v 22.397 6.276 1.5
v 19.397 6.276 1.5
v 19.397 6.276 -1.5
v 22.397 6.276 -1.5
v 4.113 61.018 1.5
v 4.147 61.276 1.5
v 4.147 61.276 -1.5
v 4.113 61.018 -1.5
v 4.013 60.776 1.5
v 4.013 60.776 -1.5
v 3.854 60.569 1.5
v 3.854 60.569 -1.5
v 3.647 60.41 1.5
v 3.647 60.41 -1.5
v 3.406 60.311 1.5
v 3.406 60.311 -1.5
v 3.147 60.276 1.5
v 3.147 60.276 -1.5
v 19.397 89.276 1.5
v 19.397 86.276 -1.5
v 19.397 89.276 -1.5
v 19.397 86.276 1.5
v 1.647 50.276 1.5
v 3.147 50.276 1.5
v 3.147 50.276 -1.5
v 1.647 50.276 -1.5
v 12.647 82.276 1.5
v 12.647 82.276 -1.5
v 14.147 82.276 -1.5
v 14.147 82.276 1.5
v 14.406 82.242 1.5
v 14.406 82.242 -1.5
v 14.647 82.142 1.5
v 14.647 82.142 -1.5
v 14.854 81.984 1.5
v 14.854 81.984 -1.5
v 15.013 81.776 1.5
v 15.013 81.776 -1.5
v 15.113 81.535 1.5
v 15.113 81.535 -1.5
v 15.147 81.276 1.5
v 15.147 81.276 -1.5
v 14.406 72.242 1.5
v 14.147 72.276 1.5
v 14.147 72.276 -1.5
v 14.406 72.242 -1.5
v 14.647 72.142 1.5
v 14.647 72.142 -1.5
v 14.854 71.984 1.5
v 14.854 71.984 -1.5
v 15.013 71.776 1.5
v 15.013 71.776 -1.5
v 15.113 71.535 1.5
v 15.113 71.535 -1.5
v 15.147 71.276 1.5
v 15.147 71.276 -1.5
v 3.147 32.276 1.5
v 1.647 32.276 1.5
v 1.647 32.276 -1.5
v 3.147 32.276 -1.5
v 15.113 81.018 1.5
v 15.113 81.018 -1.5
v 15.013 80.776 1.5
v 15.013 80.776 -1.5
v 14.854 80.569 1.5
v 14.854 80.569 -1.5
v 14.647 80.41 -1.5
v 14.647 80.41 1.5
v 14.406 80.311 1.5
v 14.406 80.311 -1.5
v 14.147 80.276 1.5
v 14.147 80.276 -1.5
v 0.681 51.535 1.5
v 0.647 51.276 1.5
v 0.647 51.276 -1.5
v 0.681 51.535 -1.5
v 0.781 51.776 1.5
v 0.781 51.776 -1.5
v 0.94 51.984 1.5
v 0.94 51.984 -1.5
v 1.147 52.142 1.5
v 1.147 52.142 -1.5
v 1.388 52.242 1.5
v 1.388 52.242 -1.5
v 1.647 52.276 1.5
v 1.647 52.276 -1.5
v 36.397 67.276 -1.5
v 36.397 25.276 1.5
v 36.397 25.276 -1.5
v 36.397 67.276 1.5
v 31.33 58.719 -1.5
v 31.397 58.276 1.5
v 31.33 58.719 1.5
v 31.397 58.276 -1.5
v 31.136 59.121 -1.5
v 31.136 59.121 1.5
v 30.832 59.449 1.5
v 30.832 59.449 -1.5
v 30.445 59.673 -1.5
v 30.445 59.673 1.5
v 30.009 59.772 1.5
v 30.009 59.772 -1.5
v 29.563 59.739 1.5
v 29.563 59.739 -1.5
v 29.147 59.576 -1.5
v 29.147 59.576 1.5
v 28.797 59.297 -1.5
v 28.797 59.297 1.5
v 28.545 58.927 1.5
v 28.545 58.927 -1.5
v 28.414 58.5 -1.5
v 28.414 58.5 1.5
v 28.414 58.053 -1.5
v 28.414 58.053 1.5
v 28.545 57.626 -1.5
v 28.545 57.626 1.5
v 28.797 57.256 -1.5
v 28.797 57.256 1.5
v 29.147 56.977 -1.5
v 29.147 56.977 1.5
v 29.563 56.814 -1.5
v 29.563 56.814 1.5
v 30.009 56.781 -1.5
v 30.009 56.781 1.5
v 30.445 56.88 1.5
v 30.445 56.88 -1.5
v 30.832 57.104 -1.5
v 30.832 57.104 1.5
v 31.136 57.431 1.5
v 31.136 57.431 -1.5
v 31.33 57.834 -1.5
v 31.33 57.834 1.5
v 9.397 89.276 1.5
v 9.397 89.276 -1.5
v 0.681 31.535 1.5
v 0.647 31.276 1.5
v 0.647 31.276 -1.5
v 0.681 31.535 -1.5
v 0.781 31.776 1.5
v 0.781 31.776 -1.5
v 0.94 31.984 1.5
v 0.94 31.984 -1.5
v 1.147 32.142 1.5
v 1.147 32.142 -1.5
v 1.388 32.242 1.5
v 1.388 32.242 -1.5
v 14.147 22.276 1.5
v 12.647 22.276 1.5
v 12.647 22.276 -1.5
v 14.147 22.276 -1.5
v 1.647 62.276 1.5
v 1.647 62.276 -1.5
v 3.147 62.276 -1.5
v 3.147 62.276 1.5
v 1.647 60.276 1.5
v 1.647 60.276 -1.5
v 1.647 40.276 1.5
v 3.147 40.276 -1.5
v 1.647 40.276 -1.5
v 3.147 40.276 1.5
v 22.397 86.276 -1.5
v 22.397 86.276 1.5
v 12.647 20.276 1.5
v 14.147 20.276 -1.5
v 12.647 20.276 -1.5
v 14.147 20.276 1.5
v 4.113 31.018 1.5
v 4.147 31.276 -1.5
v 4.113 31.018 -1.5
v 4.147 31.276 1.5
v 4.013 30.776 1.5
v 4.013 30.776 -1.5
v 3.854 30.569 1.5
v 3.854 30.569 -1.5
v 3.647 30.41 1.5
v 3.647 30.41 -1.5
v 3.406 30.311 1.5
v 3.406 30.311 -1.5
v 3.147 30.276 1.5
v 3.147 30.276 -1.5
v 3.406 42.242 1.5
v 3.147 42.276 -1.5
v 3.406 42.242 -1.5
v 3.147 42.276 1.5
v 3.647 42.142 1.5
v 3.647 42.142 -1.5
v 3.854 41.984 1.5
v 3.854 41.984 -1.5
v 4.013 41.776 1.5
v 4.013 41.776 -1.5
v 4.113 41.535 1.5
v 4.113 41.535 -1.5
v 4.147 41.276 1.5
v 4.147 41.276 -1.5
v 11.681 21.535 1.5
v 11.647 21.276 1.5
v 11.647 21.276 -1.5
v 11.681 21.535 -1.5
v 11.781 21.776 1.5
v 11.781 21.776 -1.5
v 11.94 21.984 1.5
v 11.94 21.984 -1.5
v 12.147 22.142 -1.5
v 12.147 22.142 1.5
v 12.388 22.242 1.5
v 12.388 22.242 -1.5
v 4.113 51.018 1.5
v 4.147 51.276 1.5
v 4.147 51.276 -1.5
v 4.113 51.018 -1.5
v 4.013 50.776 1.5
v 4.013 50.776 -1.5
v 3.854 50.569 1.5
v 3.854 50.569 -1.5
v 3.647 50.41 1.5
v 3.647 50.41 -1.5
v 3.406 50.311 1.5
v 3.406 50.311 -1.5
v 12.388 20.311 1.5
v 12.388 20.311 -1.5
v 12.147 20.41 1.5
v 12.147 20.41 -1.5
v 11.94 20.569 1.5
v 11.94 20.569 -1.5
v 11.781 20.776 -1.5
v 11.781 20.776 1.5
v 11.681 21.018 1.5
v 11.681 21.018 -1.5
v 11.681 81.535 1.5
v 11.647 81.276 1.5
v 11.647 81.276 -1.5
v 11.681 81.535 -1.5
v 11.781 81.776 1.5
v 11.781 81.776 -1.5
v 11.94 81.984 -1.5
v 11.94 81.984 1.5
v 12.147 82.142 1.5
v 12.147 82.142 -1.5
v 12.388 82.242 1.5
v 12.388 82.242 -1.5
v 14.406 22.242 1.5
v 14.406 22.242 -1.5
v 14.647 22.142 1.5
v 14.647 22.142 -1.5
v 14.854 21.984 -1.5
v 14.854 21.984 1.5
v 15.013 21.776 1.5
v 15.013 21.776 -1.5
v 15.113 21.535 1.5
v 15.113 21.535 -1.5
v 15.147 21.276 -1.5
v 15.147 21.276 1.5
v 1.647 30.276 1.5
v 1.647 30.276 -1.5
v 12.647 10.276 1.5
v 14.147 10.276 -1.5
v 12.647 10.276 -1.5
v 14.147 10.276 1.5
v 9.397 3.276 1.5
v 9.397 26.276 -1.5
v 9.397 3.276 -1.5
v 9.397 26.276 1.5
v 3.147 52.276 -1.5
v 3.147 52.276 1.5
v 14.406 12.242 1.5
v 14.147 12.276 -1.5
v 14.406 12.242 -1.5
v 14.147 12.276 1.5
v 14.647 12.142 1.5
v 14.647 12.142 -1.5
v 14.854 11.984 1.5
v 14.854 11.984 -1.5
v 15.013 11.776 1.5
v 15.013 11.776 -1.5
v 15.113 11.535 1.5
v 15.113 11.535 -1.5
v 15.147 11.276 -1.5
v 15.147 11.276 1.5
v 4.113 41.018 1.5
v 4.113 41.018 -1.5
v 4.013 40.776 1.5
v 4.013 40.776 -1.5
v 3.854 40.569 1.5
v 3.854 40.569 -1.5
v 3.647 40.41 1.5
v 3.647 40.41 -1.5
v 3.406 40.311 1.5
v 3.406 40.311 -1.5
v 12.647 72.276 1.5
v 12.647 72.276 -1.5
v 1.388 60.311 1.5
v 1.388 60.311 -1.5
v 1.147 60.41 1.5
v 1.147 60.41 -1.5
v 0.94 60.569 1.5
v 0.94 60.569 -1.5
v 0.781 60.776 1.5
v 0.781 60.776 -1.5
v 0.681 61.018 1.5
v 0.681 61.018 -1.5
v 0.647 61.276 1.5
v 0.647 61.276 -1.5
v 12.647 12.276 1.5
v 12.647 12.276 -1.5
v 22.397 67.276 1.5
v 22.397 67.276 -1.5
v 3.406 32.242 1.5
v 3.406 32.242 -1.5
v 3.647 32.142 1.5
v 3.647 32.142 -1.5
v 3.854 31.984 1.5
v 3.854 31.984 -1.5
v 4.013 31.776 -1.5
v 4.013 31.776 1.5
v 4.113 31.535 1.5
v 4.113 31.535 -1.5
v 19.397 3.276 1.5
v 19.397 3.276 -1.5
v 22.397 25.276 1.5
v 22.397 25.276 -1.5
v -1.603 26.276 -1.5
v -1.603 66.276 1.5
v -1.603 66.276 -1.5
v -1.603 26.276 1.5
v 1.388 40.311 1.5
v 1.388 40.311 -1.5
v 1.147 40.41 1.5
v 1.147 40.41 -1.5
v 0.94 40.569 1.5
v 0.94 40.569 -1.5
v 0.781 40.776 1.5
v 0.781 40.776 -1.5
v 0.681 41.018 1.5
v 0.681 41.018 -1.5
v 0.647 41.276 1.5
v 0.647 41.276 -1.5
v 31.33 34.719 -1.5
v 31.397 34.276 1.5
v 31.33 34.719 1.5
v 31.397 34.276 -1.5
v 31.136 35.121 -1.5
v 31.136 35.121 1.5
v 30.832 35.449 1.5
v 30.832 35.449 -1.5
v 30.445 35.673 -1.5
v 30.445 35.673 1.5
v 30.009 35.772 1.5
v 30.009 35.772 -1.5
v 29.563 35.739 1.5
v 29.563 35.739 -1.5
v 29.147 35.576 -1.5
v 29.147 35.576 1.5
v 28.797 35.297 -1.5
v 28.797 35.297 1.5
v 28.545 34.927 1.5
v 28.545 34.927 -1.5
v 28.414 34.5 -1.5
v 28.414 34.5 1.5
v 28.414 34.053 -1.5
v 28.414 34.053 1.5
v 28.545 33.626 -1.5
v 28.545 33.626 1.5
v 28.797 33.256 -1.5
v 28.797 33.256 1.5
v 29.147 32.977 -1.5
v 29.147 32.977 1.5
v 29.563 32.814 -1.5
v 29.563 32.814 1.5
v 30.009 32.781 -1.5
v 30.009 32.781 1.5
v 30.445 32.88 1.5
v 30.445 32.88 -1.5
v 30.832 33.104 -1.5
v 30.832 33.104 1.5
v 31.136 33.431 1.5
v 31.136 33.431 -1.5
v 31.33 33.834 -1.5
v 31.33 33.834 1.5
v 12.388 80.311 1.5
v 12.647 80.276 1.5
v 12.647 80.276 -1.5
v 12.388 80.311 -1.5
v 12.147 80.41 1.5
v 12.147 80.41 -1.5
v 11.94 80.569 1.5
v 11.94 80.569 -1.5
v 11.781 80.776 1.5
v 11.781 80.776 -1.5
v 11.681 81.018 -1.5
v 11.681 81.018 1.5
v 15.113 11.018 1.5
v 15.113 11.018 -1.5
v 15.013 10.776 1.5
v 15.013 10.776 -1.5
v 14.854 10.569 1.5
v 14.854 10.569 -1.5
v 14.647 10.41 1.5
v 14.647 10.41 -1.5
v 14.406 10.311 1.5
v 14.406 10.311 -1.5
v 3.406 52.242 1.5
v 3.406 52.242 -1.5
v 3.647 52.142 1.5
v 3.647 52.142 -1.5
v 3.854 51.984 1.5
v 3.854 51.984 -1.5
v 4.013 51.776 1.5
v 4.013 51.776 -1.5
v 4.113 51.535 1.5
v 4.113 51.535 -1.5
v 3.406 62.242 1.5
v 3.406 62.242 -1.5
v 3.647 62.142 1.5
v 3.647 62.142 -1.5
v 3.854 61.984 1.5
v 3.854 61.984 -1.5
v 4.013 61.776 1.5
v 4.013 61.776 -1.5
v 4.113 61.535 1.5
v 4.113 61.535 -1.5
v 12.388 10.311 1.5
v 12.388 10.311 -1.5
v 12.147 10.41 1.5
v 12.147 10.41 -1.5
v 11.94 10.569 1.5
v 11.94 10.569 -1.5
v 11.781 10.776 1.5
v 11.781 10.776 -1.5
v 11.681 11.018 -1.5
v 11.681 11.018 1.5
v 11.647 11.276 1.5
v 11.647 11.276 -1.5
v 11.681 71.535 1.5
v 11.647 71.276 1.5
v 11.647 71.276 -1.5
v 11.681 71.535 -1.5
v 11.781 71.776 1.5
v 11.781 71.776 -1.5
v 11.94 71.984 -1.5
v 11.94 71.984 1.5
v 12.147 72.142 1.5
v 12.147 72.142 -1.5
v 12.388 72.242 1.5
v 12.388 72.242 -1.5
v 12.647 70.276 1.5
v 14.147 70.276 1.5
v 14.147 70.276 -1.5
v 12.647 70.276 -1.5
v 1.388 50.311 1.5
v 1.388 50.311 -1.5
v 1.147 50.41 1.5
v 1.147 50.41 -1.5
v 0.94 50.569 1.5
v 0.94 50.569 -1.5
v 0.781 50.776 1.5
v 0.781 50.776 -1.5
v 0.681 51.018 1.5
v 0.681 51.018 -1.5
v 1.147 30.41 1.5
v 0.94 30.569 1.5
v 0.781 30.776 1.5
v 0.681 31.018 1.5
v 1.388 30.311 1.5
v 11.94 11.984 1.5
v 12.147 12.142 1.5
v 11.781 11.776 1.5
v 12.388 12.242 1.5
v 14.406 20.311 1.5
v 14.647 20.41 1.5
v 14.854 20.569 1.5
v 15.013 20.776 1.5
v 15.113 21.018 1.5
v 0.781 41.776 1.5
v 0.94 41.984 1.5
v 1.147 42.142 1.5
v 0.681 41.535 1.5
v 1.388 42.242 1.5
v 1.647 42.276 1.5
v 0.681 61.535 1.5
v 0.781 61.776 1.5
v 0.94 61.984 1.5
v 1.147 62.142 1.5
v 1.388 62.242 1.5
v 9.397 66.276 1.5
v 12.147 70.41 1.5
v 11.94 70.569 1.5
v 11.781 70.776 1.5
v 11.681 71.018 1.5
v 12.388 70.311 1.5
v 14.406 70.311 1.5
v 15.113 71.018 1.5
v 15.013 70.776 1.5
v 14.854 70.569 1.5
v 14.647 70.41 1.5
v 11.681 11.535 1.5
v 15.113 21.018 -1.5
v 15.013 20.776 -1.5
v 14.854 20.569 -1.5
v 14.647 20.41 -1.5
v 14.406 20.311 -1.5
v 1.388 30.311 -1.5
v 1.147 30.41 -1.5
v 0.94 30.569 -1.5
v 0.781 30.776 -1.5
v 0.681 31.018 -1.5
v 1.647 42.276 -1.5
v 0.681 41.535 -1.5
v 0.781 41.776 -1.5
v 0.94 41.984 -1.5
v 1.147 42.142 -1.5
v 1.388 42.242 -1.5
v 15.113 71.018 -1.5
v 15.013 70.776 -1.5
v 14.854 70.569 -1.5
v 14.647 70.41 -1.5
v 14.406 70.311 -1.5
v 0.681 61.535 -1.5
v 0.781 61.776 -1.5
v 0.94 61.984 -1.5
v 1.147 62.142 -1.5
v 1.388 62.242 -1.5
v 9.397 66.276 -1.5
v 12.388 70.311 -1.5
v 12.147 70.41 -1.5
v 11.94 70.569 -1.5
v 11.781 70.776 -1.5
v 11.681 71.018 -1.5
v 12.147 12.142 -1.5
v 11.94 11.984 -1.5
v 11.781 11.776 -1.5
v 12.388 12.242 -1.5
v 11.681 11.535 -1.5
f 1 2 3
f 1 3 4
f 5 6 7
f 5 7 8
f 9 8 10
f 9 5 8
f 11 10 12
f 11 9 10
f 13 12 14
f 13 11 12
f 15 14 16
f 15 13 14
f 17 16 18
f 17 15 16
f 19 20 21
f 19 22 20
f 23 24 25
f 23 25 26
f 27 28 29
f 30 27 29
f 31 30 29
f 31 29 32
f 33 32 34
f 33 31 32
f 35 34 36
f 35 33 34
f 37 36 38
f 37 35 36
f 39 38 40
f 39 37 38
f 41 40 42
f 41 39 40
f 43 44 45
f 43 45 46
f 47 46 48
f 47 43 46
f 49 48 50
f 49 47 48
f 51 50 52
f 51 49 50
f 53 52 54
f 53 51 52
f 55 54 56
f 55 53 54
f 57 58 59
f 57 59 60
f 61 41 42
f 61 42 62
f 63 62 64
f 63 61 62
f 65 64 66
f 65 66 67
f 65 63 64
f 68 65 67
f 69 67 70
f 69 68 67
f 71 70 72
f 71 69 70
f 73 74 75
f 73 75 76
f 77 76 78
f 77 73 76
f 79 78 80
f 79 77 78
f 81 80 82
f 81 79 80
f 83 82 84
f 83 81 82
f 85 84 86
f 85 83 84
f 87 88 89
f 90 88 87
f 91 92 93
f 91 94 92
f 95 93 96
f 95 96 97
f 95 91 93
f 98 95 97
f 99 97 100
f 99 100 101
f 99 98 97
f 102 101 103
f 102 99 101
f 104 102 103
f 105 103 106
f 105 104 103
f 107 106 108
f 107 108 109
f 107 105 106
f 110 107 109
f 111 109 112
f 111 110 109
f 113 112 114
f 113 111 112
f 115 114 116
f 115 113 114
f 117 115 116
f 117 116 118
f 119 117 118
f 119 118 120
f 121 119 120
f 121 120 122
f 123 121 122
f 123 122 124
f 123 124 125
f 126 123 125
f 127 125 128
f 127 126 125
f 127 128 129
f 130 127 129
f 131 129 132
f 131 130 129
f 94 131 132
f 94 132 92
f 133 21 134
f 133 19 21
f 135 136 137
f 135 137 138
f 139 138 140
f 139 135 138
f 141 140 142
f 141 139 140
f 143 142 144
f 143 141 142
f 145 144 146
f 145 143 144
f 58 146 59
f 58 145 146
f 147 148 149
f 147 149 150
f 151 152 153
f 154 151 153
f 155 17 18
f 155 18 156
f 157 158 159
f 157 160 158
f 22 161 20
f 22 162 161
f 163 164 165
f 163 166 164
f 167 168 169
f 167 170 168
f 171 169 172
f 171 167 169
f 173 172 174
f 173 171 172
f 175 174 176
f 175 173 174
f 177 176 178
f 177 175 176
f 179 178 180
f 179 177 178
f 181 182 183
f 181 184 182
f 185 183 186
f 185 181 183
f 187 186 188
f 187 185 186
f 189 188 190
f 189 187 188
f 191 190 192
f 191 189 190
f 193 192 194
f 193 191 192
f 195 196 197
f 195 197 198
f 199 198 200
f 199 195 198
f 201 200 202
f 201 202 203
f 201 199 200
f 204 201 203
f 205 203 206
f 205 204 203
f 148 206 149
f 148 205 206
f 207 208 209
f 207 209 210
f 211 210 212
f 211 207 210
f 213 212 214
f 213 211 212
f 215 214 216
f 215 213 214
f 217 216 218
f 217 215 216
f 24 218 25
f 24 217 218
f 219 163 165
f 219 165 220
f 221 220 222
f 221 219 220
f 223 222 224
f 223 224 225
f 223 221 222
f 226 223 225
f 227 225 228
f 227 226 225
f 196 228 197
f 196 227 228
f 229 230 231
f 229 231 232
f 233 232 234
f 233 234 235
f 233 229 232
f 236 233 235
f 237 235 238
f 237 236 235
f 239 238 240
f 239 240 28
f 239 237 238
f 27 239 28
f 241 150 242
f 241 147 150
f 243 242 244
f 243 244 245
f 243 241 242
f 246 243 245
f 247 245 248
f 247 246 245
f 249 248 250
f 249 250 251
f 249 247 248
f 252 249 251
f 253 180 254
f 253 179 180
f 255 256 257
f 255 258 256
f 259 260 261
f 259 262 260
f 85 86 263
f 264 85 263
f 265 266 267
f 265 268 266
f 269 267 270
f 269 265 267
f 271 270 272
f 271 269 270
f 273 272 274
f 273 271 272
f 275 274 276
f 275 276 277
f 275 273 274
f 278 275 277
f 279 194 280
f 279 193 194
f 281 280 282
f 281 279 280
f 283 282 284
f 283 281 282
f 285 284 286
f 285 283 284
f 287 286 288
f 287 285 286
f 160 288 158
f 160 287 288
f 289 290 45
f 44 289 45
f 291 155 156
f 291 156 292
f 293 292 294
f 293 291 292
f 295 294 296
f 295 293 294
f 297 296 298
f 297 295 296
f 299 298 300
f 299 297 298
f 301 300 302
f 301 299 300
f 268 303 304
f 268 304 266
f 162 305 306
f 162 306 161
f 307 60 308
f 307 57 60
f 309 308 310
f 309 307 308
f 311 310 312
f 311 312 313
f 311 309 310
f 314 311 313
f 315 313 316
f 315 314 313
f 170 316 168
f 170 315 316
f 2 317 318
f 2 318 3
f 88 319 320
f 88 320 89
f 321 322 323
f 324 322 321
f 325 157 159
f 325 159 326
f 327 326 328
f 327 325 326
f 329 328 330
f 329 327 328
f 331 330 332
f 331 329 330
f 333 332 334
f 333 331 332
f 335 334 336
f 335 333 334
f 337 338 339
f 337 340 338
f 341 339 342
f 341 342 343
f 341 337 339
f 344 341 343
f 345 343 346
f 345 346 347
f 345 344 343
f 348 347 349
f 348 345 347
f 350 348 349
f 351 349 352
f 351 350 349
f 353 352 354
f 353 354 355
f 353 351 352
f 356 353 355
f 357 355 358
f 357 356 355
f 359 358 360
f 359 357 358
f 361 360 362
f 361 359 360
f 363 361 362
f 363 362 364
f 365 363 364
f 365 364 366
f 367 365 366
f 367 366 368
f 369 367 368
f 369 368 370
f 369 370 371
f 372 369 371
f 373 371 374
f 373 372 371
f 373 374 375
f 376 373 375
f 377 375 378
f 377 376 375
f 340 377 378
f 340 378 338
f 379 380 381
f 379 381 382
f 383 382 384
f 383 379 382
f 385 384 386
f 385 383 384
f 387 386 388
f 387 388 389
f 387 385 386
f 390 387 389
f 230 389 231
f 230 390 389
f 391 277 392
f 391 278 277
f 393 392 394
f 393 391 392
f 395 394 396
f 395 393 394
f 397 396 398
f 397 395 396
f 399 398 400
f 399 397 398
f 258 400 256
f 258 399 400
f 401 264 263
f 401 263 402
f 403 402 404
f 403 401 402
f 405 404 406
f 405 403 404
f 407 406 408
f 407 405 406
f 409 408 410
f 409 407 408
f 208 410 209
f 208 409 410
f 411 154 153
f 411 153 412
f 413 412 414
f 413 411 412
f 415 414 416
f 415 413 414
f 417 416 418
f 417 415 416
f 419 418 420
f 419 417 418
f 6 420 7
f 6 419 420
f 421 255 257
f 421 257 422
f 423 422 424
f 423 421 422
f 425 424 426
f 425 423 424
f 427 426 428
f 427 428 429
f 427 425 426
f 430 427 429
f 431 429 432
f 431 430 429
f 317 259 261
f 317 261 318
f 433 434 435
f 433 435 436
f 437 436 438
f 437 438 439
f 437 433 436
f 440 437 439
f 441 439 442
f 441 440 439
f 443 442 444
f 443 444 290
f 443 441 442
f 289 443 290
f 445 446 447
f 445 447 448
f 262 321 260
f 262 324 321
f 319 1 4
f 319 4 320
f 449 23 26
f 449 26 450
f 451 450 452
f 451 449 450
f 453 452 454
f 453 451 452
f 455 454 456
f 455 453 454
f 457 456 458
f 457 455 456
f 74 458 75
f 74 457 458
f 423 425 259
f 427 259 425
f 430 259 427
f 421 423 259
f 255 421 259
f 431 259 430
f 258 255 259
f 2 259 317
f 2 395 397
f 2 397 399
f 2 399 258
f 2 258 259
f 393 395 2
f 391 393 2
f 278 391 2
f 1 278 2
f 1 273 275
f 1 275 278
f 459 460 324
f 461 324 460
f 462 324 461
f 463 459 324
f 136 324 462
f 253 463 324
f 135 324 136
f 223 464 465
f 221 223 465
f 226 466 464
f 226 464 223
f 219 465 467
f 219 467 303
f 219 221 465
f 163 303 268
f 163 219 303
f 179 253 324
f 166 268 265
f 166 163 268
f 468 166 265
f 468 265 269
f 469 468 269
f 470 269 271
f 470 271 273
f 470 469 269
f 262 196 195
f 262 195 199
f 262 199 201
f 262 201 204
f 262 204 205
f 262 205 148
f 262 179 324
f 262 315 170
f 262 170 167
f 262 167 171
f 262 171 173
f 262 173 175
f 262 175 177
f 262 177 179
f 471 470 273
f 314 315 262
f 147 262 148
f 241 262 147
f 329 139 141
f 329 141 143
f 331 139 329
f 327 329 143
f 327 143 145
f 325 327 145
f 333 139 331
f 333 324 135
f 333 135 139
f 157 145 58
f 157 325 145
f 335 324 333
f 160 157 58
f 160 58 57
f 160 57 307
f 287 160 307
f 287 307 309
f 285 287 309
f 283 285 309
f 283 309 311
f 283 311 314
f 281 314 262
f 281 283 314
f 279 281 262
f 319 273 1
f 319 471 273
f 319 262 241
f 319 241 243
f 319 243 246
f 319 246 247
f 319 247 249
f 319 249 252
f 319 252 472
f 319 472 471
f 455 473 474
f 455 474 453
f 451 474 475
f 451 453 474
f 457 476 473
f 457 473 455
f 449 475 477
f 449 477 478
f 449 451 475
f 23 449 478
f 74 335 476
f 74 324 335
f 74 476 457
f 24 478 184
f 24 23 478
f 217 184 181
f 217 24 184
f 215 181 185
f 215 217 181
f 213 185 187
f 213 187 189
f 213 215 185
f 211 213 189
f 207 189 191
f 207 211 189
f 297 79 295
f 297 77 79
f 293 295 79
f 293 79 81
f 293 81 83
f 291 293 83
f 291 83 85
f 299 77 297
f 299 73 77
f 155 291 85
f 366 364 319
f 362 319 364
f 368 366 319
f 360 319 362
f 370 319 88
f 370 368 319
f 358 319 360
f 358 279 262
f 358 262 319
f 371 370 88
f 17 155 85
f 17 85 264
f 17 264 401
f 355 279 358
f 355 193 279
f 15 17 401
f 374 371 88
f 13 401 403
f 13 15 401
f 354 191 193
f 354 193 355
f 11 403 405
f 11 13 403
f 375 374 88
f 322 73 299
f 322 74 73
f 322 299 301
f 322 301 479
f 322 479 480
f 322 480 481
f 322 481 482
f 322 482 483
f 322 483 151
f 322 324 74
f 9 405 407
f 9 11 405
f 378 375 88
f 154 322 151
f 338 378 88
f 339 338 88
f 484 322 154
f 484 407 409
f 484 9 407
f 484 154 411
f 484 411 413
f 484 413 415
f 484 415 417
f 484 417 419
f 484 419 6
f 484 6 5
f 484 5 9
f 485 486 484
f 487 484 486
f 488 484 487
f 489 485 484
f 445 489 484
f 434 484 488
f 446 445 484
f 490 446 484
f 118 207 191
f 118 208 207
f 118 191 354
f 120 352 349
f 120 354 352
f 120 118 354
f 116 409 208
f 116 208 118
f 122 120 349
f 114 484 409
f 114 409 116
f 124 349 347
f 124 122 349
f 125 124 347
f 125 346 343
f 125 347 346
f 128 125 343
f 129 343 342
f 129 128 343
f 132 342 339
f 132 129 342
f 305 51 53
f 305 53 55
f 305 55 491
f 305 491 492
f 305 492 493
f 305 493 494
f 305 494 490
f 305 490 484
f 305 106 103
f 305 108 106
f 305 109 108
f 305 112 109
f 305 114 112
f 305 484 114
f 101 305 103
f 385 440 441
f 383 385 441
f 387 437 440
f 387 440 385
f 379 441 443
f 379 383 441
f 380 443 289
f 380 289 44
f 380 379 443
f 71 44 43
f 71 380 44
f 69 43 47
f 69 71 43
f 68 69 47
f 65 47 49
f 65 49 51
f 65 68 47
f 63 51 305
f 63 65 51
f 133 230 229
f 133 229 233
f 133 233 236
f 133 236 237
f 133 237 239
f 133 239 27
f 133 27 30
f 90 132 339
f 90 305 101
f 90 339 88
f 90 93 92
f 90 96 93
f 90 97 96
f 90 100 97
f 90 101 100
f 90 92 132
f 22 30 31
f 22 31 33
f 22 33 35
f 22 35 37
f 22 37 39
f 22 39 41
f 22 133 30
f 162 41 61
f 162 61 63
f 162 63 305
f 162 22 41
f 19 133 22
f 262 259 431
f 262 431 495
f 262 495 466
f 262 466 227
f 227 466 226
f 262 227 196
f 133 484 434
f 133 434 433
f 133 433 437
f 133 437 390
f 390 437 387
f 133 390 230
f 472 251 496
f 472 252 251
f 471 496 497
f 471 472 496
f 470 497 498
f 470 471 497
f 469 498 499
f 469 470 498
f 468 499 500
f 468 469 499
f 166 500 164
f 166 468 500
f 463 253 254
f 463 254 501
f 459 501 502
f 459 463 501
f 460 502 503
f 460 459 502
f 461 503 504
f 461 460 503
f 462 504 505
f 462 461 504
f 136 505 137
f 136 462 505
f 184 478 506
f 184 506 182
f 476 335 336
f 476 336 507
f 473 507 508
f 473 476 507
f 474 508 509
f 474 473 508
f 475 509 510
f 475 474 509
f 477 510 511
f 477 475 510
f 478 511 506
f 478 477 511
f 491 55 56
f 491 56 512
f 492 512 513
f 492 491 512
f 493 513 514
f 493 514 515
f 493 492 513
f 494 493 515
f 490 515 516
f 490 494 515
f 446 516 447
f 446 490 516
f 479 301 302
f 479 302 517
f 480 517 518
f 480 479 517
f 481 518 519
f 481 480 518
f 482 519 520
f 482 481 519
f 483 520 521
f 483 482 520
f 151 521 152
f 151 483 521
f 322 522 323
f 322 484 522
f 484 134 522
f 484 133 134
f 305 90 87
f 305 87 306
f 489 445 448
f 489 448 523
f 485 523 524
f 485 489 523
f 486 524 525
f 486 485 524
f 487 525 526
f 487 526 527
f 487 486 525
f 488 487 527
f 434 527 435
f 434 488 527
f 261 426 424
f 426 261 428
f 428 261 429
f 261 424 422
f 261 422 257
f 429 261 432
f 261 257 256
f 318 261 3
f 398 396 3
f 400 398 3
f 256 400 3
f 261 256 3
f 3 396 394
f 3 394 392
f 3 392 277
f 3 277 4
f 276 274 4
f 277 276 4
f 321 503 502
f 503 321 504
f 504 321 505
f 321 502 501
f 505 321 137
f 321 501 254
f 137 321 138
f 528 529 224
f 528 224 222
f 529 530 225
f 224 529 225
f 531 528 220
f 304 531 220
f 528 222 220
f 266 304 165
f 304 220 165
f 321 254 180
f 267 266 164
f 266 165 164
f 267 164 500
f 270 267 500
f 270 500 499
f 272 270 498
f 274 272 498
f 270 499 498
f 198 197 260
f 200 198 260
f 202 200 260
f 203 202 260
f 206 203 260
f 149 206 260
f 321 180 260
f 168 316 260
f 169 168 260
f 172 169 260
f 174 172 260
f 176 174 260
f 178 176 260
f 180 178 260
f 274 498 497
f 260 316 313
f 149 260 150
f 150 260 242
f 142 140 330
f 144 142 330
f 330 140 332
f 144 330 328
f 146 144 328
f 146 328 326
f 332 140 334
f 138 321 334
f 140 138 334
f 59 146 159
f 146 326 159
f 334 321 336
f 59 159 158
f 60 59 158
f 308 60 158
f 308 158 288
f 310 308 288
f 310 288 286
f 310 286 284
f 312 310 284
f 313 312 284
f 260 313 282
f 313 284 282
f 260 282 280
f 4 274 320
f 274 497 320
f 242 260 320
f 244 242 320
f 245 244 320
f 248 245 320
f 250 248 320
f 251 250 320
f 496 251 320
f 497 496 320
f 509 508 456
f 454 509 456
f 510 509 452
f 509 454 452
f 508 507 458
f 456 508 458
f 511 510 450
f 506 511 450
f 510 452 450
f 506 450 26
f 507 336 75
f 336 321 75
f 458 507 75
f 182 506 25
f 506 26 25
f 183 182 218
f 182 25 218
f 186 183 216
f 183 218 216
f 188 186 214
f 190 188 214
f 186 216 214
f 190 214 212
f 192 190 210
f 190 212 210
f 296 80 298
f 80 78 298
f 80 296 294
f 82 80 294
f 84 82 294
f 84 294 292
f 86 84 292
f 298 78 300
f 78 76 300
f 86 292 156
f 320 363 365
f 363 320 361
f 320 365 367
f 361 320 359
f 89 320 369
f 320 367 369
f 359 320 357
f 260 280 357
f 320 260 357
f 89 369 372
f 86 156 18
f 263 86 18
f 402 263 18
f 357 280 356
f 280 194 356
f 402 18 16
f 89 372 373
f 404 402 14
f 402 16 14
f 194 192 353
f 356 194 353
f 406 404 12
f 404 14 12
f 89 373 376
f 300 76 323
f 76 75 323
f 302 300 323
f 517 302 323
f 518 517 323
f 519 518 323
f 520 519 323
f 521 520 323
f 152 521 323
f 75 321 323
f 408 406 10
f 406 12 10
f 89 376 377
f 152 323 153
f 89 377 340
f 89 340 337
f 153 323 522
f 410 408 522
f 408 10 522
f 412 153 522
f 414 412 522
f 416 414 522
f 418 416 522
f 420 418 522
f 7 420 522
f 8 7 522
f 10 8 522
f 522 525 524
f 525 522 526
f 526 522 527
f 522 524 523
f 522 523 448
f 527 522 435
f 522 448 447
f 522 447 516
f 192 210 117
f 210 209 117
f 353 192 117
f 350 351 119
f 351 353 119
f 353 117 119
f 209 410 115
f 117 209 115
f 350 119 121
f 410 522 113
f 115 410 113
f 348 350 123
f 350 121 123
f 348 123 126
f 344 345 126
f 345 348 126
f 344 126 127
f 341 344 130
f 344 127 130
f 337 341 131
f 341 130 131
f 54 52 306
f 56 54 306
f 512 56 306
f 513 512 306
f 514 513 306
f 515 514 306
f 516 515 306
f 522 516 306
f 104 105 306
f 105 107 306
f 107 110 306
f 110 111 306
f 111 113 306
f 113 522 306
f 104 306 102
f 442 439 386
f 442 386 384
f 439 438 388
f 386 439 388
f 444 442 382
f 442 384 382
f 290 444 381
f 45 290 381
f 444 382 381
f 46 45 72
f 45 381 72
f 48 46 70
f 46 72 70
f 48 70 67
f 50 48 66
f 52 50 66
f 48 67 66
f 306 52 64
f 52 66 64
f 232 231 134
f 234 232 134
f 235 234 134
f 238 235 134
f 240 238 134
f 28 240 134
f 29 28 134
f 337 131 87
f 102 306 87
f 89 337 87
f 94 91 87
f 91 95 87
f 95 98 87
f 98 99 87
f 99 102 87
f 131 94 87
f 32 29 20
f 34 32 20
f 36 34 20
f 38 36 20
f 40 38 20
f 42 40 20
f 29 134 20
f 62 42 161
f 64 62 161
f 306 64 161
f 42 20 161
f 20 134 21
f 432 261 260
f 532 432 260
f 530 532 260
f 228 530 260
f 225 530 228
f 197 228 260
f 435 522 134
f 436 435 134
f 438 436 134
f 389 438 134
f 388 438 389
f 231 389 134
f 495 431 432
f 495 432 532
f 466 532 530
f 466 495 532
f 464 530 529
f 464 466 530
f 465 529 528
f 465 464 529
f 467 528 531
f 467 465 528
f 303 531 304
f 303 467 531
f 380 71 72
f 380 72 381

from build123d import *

# Parameters (mm, degrees)
F0_R     = 1.5
F1_DEPTH = 1.5


with BuildPart() as f1:
    # F0 (on Top) → F1 (new body, symmetric)
    with BuildSketch(Plane.XY):
        Polygon((9.39682, 26.276459), (9.396826, 3.276474), (19.396826, 3.276474), (19.396826, 6.276474), (22.396826, 6.276474), (22.396826, 25.276474), (36.396826, 25.276474), (36.396826, 67.276474), (22.396826, 67.276474), (22.396826, 86.276474), (19.396826, 86.276474), (19.396826, 89.276474), (9.396826, 89.276474), (9.396826, 66.276474), (-1.603174, 66.276474), (-1.603197, 26.276459), align=None)
        with BuildLine():
            ThreePointArc((12.646826, 10.276474), (11.939719, 10.569367), (11.646826, 11.276474))
            ThreePointArc((11.646826, 11.276474), (11.939719, 11.983581), (12.646826, 12.276474))
            Line((12.646826, 12.276474), (14.146826, 12.276474))
            ThreePointArc((14.146826, 12.276474), (14.853933, 11.983581), (15.146826, 11.276474))
            ThreePointArc((15.146826, 11.276474), (14.853933, 10.569367), (14.146826, 10.276474))
            Line((14.146826, 10.276474), (12.646826, 10.276474))
        make_face(mode=Mode.SUBTRACT)
        with BuildLine():
            ThreePointArc((12.646826, 20.276474), (11.939719, 20.569367), (11.646826, 21.276474))
            ThreePointArc((11.646826, 21.276474), (11.939719, 21.983581), (12.646826, 22.276474))
            Line((12.646826, 22.276474), (14.146826, 22.276474))
            ThreePointArc((14.146826, 22.276474), (14.853933, 21.983581), (15.146826, 21.276474))
            ThreePointArc((15.146826, 21.276474), (14.853933, 20.569367), (14.146826, 20.276474))
            Line((14.146826, 20.276474), (12.646826, 20.276474))
        make_face(mode=Mode.SUBTRACT)
        with BuildLine():
            ThreePointArc((1.646826, 30.276474), (0.939719, 30.569367), (0.646826, 31.276474))
            ThreePointArc((0.646826, 31.276474), (0.939719, 31.983581), (1.646826, 32.276474))
            Line((1.646826, 32.276474), (3.146826, 32.276474))
            ThreePointArc((3.146826, 32.276474), (3.853933, 31.983581), (4.146826, 31.276474))
            ThreePointArc((4.146826, 31.276474), (3.853933, 30.569367), (3.146826, 30.276474))
            Line((3.146826, 30.276474), (1.646826, 30.276474))
        make_face(mode=Mode.SUBTRACT)
        with BuildLine():
            ThreePointArc((1.646826, 40.276474), (0.939719, 40.569367), (0.646826, 41.276474))
            ThreePointArc((0.646826, 41.276474), (0.939719, 41.983581), (1.646826, 42.276474))
            Line((1.646826, 42.276474), (3.146826, 42.276474))
            ThreePointArc((3.146826, 42.276474), (3.853933, 41.983581), (4.146826, 41.276474))
            ThreePointArc((4.146826, 41.276474), (3.853933, 40.569367), (3.146826, 40.276474))
            Line((3.146826, 40.276474), (1.646826, 40.276474))
        make_face(mode=Mode.SUBTRACT)
        with Locations((29.896826, 34.276474)):
            Circle(F0_R, mode=Mode.SUBTRACT)
        with BuildLine():
            ThreePointArc((1.646826, 50.276474), (0.939719, 50.569367), (0.646826, 51.276474))
            ThreePointArc((0.646826, 51.276474), (0.939719, 51.983581), (1.646826, 52.276474))
            Line((1.646826, 52.276474), (3.146826, 52.276474))
            ThreePointArc((3.146826, 52.276474), (3.853933, 51.983581), (4.146826, 51.276474))
            ThreePointArc((4.146826, 51.276474), (3.853933, 50.569367), (3.146826, 50.276474))
            Line((3.146826, 50.276474), (1.646826, 50.276474))
        make_face(mode=Mode.SUBTRACT)
        with BuildLine():
            ThreePointArc((1.646826, 60.276474), (0.939719, 60.569367), (0.646826, 61.276474))
            ThreePointArc((0.646826, 61.276474), (0.939719, 61.983581), (1.646826, 62.276474))
            Line((1.646826, 62.276474), (3.146826, 62.276474))
            ThreePointArc((3.146826, 62.276474), (3.853933, 61.983581), (4.146826, 61.276474))
            ThreePointArc((4.146826, 61.276474), (3.853933, 60.569367), (3.146826, 60.276474))
            Line((3.146826, 60.276474), (1.646826, 60.276474))
        make_face(mode=Mode.SUBTRACT)
        with BuildLine():
            ThreePointArc((12.646826, 70.276474), (11.939719, 70.569367), (11.646826, 71.276474))
            ThreePointArc((11.646826, 71.276474), (11.939719, 71.983581), (12.646826, 72.276474))
            Line((12.646826, 72.276474), (14.146826, 72.276474))
            ThreePointArc((14.146826, 72.276474), (14.853933, 71.983581), (15.146826, 71.276474))
            ThreePointArc((15.146826, 71.276474), (14.853933, 70.569367), (14.146826, 70.276474))
            Line((14.146826, 70.276474), (12.646826, 70.276474))
        make_face(mode=Mode.SUBTRACT)
        with BuildLine():
            ThreePointArc((12.646826, 80.276474), (11.939719, 80.569367), (11.646826, 81.276474))
            ThreePointArc((11.646826, 81.276474), (11.939719, 81.983581), (12.646826, 82.276474))
            Line((12.646826, 82.276474), (14.146826, 82.276474))
            ThreePointArc((14.146826, 82.276474), (14.853933, 81.983581), (15.146826, 81.276474))
            ThreePointArc((15.146826, 81.276474), (14.853933, 80.569367), (14.146826, 80.276474))
            Line((14.146826, 80.276474), (12.646826, 80.276474))
        make_face(mode=Mode.SUBTRACT)
        with Locations((29.896826, 58.276474)):
            Circle(F0_R, mode=Mode.SUBTRACT)
    extrude(amount=F1_DEPTH, both=True)


solid = f1.part
